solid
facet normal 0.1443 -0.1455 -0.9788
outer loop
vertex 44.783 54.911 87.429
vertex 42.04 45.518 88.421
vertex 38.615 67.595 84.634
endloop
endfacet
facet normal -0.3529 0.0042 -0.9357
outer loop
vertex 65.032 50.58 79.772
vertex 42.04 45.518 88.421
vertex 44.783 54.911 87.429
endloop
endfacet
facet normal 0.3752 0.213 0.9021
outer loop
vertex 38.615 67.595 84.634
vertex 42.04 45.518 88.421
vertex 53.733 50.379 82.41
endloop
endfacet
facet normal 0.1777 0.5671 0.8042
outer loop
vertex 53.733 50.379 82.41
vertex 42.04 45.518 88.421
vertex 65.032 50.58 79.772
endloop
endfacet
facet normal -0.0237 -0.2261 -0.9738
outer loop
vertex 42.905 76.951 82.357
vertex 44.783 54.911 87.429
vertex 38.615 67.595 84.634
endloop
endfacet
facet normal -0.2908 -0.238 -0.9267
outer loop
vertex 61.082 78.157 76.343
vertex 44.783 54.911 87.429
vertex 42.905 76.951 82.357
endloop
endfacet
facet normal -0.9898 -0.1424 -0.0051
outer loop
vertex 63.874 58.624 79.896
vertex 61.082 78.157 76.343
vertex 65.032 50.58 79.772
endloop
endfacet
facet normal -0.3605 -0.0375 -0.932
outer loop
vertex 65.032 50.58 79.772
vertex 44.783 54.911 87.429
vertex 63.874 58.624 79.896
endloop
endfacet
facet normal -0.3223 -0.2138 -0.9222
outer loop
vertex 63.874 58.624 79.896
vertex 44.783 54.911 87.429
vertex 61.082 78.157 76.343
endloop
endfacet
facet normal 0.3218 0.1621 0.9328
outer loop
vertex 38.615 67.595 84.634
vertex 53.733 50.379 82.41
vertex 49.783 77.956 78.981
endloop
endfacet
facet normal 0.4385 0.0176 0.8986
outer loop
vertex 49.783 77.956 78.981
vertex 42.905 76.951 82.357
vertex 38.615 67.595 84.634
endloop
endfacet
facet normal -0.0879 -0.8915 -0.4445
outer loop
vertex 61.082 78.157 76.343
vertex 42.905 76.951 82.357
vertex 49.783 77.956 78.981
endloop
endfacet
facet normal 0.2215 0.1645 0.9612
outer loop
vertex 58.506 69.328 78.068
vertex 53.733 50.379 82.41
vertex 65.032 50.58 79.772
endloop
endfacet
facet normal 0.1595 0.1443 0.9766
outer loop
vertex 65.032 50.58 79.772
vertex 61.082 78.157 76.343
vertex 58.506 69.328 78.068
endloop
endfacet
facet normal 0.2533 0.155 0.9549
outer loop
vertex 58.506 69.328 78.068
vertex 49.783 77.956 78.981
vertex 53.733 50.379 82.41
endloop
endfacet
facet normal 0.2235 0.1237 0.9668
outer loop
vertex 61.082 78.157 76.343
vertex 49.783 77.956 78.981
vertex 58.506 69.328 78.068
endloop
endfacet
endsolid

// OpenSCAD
// Auto-generated auxetic polyhedron
points = [
    [38.615369, 67.595289, 84.633620],
    [42.040002, 45.518078, 88.421479],
    [44.782667, 54.910586, 87.429125],
    [65.031856, 50.579509, 79.771826],
    [53.732889, 50.378664, 82.410176],
    [42.904640, 76.950780, 82.357239],
    [61.081946, 78.156499, 76.342504],
    [63.873512, 58.623732, 79.896061],
    [49.782979, 77.955653, 78.980854],
    [58.506331, 69.327507, 78.068158],
];

faces = [
    [0, 1, 2],
    [2, 1, 3],
    [4, 1, 0],
    [3, 1, 4],
    [0, 2, 5],
    [5, 2, 6],
    [3, 6, 7],
    [7, 2, 3],
    [6, 2, 7],
    [8, 4, 0],
    [0, 5, 8],
    [8, 5, 6],
    [3, 4, 9],
    [9, 6, 3],
    [4, 8, 9],
    [9, 8, 6],
];

polyhedron(points = points, faces = faces);
